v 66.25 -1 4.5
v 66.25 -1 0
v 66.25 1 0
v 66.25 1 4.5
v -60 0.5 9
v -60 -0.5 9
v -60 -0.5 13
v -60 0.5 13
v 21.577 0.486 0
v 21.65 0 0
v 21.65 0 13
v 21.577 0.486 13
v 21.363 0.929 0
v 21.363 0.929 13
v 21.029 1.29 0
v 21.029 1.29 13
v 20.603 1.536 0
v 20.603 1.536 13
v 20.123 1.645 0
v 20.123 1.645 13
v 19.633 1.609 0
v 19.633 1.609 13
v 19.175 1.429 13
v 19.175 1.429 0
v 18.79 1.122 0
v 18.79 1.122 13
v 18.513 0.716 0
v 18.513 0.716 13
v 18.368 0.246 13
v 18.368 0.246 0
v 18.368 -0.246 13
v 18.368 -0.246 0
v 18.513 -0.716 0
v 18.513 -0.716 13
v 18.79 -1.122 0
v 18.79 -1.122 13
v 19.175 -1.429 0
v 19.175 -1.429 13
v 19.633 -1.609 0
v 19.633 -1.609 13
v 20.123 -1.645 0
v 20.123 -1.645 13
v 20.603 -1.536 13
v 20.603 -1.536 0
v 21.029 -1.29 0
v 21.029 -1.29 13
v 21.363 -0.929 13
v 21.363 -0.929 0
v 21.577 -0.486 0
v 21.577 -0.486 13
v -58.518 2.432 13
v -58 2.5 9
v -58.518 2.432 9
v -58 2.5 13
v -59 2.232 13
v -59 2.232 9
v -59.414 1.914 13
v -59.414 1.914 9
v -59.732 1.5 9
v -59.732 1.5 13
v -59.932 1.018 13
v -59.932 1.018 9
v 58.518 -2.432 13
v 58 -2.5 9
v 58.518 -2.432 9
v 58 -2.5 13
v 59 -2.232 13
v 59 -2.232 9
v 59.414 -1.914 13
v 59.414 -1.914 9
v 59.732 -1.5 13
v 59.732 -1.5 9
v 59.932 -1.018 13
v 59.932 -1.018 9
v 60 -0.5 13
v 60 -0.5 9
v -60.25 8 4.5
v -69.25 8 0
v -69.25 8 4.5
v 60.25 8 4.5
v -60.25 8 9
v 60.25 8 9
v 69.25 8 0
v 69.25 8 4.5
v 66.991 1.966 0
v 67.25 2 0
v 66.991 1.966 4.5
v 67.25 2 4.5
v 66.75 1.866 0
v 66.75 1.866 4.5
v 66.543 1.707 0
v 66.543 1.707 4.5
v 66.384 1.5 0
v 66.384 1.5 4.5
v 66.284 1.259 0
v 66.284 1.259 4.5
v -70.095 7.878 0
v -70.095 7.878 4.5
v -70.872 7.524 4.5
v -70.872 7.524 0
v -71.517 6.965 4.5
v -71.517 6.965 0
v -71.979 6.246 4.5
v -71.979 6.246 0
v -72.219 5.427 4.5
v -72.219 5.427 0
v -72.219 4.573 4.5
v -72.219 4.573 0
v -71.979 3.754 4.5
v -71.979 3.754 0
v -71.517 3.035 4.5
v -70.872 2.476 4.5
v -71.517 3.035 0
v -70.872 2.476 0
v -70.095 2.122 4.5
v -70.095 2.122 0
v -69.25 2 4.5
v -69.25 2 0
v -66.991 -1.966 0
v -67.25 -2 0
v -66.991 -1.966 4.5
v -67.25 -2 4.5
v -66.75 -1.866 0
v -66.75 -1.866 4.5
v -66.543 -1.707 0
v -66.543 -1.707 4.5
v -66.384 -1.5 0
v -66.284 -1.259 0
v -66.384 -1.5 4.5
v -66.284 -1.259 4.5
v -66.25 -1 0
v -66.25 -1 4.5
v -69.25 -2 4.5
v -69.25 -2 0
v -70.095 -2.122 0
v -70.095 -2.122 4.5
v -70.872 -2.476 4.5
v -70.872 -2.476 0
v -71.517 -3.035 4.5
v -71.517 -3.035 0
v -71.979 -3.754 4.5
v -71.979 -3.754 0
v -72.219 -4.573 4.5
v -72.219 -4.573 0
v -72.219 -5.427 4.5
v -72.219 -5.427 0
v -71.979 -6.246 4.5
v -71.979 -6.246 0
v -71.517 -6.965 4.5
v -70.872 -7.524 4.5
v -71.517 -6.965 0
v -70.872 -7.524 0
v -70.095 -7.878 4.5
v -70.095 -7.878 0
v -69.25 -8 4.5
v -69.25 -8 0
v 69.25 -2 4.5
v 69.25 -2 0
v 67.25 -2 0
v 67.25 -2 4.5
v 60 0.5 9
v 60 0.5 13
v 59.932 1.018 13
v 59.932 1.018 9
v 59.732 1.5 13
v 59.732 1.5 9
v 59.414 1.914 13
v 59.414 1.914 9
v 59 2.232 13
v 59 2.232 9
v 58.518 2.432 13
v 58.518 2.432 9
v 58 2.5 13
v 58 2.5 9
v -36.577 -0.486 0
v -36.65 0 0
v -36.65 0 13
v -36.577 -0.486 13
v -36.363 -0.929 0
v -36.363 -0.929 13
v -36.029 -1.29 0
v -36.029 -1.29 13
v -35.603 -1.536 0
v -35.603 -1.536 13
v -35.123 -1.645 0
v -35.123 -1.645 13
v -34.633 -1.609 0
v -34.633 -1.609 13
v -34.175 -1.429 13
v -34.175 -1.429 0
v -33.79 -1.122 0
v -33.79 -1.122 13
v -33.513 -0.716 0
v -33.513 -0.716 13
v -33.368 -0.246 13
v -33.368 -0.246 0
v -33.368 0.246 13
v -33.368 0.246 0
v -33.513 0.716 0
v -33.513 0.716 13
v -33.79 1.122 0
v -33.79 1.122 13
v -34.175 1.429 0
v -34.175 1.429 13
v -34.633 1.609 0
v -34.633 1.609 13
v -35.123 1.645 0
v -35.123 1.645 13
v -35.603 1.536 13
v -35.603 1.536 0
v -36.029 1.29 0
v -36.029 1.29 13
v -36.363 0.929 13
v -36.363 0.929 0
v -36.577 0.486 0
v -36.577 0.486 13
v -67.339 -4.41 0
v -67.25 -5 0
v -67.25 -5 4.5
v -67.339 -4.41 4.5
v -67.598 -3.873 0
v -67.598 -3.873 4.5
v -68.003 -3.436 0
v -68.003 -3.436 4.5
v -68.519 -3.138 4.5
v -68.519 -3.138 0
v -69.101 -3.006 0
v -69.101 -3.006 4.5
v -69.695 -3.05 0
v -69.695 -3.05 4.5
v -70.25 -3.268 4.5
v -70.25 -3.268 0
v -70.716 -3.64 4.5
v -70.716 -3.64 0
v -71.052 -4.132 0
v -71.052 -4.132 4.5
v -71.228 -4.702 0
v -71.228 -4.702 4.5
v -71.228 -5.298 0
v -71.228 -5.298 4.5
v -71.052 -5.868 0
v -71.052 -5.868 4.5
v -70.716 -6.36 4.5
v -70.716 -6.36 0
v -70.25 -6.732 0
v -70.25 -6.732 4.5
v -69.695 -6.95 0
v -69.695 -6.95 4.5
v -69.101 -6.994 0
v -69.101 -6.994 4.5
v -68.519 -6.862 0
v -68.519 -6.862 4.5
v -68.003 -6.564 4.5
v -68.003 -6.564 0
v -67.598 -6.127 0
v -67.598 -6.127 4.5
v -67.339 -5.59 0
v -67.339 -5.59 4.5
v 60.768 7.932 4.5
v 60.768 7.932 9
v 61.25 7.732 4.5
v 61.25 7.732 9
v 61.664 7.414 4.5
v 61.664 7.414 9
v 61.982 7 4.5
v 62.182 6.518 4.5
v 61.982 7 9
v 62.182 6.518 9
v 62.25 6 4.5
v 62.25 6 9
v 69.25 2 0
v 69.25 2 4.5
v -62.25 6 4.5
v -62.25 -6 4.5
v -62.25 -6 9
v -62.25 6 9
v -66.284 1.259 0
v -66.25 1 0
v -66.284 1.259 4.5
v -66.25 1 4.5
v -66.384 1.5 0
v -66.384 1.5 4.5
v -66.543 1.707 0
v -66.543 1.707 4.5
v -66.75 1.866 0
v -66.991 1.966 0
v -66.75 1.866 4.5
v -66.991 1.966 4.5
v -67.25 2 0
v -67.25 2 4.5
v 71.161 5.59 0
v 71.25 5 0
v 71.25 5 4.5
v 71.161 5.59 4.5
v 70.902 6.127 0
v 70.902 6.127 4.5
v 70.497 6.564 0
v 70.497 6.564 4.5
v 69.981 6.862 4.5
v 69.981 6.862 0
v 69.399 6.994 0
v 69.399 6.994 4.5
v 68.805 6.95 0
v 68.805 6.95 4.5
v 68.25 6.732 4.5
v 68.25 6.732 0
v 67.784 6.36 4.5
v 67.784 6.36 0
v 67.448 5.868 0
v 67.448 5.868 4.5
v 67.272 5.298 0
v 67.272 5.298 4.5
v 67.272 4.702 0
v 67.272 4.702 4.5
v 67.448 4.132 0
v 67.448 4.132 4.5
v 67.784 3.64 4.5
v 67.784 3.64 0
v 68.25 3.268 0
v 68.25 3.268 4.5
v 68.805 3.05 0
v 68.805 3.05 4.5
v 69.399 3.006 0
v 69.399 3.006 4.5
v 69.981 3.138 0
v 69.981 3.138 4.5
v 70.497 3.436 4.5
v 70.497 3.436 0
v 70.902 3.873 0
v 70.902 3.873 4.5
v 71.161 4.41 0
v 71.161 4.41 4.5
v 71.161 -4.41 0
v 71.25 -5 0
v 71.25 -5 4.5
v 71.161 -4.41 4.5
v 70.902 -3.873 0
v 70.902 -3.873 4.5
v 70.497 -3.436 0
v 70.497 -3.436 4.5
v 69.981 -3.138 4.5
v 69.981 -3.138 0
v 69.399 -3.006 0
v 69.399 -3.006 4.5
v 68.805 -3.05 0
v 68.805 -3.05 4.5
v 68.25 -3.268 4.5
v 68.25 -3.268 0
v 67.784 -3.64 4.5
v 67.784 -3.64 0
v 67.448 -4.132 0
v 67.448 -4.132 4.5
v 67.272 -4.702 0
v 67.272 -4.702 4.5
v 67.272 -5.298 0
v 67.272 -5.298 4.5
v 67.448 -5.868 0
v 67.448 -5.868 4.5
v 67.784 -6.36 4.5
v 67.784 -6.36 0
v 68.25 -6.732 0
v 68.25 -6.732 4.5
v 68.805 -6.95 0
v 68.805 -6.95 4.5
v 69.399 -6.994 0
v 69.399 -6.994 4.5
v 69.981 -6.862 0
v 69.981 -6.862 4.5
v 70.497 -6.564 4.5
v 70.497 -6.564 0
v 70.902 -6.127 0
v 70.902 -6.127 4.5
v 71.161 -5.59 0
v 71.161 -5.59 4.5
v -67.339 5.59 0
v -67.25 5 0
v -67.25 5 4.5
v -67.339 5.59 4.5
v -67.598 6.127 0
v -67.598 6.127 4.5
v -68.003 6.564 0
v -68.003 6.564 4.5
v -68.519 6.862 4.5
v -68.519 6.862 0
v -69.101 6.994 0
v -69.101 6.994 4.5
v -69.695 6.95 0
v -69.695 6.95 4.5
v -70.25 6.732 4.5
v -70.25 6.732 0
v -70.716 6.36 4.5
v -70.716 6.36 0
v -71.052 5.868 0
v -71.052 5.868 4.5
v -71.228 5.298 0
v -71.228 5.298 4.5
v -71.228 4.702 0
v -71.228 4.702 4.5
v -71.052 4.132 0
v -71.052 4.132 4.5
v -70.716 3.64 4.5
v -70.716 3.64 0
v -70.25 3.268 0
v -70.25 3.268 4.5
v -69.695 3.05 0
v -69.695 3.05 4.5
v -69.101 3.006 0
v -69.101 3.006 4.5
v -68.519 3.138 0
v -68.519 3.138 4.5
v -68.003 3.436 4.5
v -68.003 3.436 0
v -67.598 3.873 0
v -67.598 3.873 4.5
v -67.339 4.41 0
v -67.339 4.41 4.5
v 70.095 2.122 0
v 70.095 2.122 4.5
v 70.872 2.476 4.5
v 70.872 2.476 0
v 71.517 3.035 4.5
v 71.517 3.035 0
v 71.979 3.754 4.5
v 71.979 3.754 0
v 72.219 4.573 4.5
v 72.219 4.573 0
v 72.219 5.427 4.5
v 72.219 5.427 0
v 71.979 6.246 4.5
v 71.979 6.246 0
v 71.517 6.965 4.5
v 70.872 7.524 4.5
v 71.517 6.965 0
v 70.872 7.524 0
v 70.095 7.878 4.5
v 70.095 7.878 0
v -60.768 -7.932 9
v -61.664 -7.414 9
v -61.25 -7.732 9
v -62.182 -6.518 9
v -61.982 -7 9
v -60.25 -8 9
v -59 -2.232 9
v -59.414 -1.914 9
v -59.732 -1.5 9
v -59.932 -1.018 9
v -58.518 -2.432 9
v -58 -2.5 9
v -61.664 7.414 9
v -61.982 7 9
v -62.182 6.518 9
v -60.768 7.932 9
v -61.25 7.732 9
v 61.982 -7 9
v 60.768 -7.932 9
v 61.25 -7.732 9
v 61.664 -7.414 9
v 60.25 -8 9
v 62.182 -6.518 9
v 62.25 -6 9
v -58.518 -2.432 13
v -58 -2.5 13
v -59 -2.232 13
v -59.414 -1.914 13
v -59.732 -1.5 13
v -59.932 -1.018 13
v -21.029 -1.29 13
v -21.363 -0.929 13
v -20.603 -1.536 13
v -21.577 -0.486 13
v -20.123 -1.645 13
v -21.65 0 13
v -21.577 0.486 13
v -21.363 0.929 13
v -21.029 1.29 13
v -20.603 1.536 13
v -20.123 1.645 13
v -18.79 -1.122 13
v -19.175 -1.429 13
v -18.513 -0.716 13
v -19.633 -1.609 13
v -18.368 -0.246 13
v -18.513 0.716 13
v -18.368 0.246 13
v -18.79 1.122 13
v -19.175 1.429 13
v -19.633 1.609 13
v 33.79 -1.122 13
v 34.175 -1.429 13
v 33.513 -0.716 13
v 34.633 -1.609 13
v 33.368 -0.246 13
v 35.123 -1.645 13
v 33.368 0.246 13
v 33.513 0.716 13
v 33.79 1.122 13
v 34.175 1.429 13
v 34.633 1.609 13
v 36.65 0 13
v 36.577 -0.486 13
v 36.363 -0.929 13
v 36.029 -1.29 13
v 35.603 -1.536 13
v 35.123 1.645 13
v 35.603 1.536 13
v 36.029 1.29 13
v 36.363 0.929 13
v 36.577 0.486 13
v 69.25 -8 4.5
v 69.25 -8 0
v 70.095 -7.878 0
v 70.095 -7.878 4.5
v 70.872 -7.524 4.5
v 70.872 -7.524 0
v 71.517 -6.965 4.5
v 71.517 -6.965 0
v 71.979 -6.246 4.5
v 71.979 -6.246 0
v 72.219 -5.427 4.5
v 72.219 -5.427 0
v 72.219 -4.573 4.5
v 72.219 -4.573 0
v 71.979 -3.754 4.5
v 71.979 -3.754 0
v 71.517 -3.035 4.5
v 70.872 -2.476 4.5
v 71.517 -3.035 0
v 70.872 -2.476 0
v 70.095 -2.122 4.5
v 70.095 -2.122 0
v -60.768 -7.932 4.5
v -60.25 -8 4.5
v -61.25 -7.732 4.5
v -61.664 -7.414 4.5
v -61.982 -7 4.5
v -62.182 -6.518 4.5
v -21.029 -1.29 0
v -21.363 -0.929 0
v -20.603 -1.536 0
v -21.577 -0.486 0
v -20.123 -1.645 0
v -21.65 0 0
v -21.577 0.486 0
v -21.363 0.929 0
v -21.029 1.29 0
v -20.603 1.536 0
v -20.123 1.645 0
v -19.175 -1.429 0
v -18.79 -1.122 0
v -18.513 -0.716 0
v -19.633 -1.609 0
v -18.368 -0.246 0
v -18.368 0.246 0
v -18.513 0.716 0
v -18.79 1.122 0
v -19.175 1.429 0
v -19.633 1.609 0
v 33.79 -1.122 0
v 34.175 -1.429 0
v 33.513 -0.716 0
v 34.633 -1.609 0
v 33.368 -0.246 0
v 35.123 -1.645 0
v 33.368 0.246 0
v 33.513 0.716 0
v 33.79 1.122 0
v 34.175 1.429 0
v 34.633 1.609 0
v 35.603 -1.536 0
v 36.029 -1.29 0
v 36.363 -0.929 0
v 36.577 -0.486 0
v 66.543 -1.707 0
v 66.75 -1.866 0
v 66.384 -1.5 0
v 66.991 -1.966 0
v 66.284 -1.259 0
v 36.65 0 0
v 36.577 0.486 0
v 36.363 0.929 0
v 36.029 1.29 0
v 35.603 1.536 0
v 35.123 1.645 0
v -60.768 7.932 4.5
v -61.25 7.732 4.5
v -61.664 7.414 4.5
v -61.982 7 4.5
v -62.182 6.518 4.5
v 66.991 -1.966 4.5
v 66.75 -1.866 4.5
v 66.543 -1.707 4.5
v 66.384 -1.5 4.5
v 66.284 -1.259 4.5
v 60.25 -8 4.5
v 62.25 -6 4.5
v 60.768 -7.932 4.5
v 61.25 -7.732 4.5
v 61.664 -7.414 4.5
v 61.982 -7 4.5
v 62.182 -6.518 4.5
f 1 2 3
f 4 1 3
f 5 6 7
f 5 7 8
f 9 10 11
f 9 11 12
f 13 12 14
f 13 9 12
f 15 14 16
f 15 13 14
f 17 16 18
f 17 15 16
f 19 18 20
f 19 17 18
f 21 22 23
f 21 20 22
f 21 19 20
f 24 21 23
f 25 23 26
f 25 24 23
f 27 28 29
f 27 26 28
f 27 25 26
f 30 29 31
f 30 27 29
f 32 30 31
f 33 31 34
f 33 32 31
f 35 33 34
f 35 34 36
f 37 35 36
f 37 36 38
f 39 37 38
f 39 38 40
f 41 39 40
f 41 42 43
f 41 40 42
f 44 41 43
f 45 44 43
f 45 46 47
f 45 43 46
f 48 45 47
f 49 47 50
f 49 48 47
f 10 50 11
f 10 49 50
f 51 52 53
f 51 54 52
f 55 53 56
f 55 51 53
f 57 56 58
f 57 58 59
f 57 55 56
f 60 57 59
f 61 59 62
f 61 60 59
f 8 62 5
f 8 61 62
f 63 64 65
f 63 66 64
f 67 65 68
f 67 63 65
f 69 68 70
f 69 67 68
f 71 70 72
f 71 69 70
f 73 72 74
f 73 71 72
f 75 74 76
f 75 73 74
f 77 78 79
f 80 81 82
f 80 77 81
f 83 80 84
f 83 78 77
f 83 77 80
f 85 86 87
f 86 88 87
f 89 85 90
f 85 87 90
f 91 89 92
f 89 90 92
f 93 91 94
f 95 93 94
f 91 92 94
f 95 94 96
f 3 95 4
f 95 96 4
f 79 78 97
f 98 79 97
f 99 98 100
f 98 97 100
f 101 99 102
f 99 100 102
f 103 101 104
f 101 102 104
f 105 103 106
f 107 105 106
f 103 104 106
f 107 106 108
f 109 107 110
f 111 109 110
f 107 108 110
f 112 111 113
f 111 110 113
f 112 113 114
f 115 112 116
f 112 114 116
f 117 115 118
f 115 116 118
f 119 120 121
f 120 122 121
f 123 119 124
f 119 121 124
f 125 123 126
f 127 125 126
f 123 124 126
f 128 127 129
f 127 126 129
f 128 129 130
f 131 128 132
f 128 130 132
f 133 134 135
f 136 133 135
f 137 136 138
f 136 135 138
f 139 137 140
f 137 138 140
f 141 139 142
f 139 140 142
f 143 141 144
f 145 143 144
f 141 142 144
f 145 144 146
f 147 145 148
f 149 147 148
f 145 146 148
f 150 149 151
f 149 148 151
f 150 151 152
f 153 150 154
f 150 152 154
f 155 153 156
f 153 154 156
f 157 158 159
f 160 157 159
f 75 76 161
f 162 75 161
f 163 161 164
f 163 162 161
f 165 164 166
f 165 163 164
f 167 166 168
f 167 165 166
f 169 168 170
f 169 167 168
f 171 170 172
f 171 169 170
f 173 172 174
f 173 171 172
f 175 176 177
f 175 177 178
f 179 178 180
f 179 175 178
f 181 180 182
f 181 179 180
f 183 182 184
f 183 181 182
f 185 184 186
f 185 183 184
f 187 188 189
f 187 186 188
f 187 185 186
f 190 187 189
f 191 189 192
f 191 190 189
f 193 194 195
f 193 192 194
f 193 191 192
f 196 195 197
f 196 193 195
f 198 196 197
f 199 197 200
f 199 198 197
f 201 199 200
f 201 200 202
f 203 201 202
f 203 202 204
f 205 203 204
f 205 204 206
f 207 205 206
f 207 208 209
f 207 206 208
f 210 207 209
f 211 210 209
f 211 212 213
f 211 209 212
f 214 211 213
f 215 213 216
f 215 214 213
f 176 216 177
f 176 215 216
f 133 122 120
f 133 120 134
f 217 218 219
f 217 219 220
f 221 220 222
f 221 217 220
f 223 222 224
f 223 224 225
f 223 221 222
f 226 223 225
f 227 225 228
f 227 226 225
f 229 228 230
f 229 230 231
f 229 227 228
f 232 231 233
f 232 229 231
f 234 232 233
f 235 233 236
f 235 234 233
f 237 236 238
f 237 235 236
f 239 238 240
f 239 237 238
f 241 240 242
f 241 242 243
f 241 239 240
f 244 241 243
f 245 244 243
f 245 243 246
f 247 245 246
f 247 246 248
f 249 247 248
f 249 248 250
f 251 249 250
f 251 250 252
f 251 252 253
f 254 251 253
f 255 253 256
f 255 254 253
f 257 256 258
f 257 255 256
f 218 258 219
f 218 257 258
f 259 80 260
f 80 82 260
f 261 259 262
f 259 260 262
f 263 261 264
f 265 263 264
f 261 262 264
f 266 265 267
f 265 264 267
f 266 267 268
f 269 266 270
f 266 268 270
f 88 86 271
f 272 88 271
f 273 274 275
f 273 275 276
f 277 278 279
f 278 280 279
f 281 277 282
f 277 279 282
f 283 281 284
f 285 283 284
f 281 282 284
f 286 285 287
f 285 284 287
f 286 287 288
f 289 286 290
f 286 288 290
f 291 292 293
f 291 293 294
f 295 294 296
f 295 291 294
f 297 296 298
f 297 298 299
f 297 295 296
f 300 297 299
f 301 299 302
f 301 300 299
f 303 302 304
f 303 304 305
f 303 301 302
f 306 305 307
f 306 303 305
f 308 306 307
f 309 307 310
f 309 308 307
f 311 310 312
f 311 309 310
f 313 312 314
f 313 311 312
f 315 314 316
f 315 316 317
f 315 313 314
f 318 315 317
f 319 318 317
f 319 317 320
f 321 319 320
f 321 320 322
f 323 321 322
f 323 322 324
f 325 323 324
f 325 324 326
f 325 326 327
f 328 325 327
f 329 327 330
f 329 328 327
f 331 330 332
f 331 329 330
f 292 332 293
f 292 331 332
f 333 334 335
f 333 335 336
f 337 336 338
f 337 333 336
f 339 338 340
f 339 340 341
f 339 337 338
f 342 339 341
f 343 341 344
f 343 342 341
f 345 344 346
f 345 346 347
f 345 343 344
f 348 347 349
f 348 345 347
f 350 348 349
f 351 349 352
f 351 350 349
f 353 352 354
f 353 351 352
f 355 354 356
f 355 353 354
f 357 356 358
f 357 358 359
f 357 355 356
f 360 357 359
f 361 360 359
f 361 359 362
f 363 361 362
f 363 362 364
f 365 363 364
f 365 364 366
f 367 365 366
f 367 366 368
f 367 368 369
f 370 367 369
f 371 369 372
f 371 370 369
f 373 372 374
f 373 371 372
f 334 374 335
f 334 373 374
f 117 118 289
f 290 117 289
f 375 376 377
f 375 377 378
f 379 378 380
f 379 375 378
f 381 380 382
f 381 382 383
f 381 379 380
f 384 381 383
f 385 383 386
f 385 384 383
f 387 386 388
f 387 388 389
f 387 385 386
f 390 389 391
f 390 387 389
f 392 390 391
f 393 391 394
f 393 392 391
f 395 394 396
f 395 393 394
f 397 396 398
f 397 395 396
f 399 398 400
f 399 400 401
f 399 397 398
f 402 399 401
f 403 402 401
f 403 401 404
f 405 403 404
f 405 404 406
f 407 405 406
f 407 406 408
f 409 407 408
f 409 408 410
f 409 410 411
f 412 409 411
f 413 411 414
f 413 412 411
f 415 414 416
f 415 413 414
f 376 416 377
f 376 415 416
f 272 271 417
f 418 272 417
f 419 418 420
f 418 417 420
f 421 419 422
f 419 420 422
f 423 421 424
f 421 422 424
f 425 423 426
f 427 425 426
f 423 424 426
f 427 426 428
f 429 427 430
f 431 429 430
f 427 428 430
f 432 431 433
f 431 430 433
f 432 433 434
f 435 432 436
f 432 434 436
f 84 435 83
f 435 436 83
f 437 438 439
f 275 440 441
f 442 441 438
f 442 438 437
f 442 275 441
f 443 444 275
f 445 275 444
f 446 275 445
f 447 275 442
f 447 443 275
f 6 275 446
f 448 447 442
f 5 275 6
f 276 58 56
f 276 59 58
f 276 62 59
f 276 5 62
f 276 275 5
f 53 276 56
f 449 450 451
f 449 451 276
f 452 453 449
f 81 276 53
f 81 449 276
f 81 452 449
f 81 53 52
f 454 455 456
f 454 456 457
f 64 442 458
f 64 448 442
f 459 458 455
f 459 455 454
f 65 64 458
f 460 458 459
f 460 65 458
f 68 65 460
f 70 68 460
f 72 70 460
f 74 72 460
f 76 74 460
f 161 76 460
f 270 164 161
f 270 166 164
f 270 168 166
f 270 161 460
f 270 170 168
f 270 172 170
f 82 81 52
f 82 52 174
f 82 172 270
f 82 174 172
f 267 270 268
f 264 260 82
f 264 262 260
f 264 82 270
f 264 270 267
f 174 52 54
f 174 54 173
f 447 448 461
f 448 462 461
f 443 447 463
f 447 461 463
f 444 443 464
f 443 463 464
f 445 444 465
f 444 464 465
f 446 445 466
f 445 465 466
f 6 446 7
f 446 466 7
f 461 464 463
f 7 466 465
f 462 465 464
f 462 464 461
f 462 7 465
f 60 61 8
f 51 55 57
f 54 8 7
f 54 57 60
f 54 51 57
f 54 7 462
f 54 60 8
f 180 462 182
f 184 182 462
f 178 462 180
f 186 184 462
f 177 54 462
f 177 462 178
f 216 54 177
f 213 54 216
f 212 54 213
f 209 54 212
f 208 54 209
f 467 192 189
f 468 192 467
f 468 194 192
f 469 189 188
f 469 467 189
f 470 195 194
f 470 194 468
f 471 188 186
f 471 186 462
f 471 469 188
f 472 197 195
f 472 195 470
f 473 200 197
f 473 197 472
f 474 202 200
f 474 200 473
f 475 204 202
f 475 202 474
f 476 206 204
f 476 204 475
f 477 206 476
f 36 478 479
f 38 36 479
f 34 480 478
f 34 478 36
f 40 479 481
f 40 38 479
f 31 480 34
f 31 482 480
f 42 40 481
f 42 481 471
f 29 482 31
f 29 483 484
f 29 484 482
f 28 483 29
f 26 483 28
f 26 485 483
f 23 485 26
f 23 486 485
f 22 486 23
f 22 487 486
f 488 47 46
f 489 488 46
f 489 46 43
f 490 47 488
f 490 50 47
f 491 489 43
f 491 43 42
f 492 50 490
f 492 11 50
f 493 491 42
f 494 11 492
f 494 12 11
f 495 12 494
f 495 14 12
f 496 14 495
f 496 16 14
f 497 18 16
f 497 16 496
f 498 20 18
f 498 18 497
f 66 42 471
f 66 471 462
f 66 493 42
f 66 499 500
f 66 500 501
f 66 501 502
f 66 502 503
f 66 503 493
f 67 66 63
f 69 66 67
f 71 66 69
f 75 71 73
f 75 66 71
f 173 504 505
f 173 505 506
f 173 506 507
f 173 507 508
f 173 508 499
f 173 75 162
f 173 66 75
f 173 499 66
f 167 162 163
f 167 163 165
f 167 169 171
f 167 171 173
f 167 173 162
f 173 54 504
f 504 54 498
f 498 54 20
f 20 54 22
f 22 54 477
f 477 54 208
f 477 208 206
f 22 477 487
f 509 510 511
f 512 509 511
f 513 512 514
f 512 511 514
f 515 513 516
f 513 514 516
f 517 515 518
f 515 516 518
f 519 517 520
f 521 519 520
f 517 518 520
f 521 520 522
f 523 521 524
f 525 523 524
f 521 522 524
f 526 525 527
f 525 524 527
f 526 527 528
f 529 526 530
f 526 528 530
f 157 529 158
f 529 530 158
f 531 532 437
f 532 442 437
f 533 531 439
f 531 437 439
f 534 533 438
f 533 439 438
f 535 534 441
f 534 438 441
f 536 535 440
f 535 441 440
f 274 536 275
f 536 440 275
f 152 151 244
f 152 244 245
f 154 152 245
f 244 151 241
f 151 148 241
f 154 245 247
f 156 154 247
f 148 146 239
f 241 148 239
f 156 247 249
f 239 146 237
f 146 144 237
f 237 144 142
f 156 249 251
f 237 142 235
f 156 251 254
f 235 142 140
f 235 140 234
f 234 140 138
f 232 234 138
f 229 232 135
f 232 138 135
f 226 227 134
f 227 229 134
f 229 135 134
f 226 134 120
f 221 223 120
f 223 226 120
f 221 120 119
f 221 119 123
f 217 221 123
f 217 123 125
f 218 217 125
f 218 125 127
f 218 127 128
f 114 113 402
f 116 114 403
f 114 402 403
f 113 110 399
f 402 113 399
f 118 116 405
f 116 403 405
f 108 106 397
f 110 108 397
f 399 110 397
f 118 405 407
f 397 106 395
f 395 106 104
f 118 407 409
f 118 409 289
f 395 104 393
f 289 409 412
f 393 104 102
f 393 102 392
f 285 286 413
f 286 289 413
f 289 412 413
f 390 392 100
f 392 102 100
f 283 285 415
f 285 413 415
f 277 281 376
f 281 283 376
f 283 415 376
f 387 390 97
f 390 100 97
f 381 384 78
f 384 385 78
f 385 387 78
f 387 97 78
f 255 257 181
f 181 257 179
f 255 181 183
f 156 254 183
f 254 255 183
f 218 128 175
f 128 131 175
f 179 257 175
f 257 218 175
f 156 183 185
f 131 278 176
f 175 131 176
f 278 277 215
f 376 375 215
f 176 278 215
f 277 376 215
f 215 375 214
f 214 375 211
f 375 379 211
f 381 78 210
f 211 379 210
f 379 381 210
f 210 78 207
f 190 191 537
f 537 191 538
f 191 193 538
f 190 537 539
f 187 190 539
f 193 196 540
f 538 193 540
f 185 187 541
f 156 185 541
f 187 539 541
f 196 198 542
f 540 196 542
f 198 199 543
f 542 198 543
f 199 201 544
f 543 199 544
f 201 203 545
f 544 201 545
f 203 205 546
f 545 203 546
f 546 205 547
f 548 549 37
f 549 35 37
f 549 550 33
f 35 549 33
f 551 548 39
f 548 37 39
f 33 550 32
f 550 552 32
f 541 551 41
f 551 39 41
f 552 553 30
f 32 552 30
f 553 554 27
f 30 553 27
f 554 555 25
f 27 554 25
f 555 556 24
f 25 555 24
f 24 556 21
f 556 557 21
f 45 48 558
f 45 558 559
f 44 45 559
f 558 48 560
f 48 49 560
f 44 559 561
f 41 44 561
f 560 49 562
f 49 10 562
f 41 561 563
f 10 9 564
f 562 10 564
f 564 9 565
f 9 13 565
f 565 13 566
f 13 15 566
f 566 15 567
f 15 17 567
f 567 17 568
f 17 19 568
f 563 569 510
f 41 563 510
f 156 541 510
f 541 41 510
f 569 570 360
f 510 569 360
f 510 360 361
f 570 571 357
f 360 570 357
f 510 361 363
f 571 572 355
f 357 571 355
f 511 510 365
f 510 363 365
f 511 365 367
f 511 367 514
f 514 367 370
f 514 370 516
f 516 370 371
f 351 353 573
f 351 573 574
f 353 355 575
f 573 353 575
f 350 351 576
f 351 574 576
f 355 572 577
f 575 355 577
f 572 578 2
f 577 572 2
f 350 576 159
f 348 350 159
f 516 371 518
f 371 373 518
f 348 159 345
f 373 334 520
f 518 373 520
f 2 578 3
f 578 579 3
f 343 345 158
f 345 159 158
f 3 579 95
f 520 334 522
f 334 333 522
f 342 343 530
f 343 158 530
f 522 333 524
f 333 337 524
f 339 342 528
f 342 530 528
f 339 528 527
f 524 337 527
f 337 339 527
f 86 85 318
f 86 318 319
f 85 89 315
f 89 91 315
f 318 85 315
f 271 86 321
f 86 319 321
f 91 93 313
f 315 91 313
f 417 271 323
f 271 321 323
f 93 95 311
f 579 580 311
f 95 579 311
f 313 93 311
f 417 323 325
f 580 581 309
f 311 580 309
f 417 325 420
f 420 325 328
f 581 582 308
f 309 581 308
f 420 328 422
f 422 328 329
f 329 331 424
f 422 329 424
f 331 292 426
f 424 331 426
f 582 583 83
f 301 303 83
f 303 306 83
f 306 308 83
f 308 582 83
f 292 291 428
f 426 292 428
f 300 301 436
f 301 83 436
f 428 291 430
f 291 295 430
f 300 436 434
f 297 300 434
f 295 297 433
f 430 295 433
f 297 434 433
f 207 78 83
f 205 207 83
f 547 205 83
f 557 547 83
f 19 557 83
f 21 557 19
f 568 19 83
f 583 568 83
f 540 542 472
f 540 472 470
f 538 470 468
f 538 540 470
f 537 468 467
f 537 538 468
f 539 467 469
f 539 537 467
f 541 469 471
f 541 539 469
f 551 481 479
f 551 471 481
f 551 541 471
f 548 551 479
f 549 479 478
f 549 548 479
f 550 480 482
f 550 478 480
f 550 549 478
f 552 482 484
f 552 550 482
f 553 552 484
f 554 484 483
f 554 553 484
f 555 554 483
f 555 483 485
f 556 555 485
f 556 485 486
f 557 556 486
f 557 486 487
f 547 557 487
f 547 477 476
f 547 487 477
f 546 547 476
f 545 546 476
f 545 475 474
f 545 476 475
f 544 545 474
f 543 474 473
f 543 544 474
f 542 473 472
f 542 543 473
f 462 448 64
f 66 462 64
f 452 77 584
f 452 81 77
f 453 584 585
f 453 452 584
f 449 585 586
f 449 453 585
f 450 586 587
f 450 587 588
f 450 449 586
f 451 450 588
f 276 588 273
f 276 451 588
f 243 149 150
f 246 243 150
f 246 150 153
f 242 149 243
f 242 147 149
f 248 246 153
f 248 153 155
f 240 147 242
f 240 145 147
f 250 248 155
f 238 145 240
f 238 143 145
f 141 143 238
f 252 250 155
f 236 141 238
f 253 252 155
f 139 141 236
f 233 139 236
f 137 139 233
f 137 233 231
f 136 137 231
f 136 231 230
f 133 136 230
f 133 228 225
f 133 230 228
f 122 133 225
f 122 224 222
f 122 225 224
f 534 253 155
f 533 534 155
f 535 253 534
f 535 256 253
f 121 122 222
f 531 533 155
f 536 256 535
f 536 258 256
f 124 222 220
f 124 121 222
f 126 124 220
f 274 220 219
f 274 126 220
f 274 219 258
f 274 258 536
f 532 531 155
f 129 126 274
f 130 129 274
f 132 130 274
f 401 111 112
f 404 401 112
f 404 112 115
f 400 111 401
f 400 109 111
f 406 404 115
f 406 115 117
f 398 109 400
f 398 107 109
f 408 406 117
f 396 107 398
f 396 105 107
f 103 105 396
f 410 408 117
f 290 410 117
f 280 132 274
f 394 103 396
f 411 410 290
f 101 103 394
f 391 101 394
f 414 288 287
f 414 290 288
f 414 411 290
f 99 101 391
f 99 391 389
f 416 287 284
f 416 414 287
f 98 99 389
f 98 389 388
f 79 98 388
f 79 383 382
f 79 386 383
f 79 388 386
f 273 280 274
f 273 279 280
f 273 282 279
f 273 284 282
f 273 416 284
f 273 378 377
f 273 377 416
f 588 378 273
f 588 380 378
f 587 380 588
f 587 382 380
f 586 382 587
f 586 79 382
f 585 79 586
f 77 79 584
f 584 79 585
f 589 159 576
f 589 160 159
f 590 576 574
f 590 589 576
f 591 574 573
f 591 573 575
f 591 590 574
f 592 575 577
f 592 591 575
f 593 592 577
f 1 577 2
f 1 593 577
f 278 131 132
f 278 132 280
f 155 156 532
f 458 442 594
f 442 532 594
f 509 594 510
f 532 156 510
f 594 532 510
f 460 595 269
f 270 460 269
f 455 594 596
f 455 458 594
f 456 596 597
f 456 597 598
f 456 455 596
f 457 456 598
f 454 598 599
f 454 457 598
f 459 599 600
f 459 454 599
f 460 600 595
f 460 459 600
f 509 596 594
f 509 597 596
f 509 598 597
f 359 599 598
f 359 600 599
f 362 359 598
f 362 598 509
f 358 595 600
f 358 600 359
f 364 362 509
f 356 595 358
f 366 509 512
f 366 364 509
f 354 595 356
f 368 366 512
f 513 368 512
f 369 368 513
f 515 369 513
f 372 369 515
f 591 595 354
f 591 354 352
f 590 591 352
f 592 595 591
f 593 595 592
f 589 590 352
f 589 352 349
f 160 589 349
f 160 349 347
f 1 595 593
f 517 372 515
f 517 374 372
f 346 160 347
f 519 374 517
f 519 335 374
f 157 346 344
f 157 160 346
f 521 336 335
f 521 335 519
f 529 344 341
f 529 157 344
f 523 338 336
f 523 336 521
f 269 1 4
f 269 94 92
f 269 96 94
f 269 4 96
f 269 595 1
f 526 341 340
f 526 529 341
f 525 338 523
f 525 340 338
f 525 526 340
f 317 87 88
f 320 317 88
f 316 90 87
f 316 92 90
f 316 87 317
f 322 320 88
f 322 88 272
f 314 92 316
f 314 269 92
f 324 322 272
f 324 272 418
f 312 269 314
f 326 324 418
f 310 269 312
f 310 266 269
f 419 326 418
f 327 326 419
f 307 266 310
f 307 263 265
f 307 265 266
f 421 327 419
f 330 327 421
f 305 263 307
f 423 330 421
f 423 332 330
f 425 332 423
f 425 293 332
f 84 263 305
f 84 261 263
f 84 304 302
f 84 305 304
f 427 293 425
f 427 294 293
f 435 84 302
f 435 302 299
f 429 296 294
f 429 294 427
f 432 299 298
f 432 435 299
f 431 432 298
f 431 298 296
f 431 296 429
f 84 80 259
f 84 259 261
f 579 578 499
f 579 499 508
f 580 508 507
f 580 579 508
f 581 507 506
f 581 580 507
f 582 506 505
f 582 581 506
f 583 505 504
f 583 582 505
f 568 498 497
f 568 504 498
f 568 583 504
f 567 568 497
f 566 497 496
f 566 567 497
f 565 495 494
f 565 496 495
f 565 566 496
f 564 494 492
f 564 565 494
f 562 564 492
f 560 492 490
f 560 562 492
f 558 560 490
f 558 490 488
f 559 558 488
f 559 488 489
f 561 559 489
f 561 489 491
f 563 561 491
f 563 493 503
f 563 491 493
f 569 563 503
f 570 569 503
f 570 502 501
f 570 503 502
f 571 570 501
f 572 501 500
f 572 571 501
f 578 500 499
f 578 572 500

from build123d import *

# Parameters (mm, degrees)
SKETCH_1_R               = 2
EXTRUDE_1_DEPTH          = 4.5
FILLET_1_R               = 1
SKETCH_5_W               = 124.5
SKETCH_5_H               = 16
EXTRUDE_2_DEPTH          = 4.5
SKETCH_6_W               = 120
SKETCH_6_H               = 5
EXTRUDE_3_DEPTH          = 4
CUT_EXTRUDE_1_DEPTH      = 74.186832832
CUT_EXTRUDE_1_DEPTH_BACK = 74.186832832
SKETCH_2_R               = 1.65
FILLET_3_R               = 2


with BuildPart() as part:
    # 草图1 → 凸台-拉伸1 (new body)
    with BuildSketch(Plane.XY):
        with BuildLine():
            ThreePointArc((-69.25, 8), (-72.25, 5), (-69.25, 2))
            Line((-69.25, 2), (-66.25, 2))
            Line((-66.25, 2), (-66.25, -2))
            Line((-66.25, -2), (-69.25, -2))
            ThreePointArc((-69.25, -2), (-72.25, -5), (-69.25, -8))
            Line((-69.25, -8), (69.25, -8))
            ThreePointArc((69.25, -8), (72.25, -5), (69.25, -2))
            Line((69.25, -2), (66.25, -2))
            Line((66.25, -2), (66.25, 2))
            Line((66.25, 2), (69.25, 2))
            ThreePointArc((69.25, 2), (72.25, 5), (69.25, 8))
            Line((69.25, 8), (-69.25, 8))
        make_face()
        with Locations((-69.25, 5)):
            Circle(SKETCH_1_R, mode=Mode.SUBTRACT)
        with Locations((69.25, 5)):
            Circle(SKETCH_1_R, mode=Mode.SUBTRACT)
        with Locations((69.25, -5)):
            Circle(SKETCH_1_R, mode=Mode.SUBTRACT)
        with Locations((-69.25, -5)):
            Circle(SKETCH_1_R, mode=Mode.SUBTRACT)
    extrude(amount=EXTRUDE_1_DEPTH)

    # 圆角1
    fillet_1_edges = [part.edges().sort_by_distance(p)[0] for p in [
        (-66.25, -2, 2.25),
        (-66.25, 2, 2.25),
        (66.25, 2, 2.25),
        (66.25, -2, 2.25),
    ]]
    fillet(fillet_1_edges, radius=FILLET_1_R)

    # 草图5 → 凸台-拉伸2 (add)
    with BuildSketch(Plane.XY.offset(4.5)):
        Rectangle(SKETCH_5_W, SKETCH_5_H)
    extrude(amount=EXTRUDE_2_DEPTH)

    # 草图6 → 凸台-拉伸3 (add)
    with BuildSketch(Plane.XY.offset(9)):
        Rectangle(SKETCH_6_W, SKETCH_6_H)
    extrude(amount=EXTRUDE_3_DEPTH)

    # 草图2 → 切除-拉伸1 (cut, two sides: drawn at the far end of the back side and taken through both)
    with BuildSketch(Plane.XY.offset(4.5).offset(-CUT_EXTRUDE_1_DEPTH_BACK)):
        with Locations((35, 0)):
            Circle(SKETCH_2_R)
        with Locations((20, 0)):
            Circle(SKETCH_2_R)
        with Locations((-20, 0)):
            Circle(SKETCH_2_R)
        with Locations((-35, 0)):
            Circle(SKETCH_2_R)
    extrude(amount=CUT_EXTRUDE_1_DEPTH + CUT_EXTRUDE_1_DEPTH_BACK, mode=Mode.SUBTRACT)

    # 圆角3
    fillet_3_edges = [part.edges().sort_by_distance(p)[0] for p in [
        (-62.25, 8, 6.75),
        (62.25, 8, 6.75),
        (62.25, -8, 6.75),
        (-62.25, -8, 6.75),
        (-60, -2.5, 11),
        (60, -2.5, 11),
        (60, 2.5, 11),
        (-60, 2.5, 11),
    ]]
    fillet(fillet_3_edges, radius=FILLET_3_R)


solid = part.part
